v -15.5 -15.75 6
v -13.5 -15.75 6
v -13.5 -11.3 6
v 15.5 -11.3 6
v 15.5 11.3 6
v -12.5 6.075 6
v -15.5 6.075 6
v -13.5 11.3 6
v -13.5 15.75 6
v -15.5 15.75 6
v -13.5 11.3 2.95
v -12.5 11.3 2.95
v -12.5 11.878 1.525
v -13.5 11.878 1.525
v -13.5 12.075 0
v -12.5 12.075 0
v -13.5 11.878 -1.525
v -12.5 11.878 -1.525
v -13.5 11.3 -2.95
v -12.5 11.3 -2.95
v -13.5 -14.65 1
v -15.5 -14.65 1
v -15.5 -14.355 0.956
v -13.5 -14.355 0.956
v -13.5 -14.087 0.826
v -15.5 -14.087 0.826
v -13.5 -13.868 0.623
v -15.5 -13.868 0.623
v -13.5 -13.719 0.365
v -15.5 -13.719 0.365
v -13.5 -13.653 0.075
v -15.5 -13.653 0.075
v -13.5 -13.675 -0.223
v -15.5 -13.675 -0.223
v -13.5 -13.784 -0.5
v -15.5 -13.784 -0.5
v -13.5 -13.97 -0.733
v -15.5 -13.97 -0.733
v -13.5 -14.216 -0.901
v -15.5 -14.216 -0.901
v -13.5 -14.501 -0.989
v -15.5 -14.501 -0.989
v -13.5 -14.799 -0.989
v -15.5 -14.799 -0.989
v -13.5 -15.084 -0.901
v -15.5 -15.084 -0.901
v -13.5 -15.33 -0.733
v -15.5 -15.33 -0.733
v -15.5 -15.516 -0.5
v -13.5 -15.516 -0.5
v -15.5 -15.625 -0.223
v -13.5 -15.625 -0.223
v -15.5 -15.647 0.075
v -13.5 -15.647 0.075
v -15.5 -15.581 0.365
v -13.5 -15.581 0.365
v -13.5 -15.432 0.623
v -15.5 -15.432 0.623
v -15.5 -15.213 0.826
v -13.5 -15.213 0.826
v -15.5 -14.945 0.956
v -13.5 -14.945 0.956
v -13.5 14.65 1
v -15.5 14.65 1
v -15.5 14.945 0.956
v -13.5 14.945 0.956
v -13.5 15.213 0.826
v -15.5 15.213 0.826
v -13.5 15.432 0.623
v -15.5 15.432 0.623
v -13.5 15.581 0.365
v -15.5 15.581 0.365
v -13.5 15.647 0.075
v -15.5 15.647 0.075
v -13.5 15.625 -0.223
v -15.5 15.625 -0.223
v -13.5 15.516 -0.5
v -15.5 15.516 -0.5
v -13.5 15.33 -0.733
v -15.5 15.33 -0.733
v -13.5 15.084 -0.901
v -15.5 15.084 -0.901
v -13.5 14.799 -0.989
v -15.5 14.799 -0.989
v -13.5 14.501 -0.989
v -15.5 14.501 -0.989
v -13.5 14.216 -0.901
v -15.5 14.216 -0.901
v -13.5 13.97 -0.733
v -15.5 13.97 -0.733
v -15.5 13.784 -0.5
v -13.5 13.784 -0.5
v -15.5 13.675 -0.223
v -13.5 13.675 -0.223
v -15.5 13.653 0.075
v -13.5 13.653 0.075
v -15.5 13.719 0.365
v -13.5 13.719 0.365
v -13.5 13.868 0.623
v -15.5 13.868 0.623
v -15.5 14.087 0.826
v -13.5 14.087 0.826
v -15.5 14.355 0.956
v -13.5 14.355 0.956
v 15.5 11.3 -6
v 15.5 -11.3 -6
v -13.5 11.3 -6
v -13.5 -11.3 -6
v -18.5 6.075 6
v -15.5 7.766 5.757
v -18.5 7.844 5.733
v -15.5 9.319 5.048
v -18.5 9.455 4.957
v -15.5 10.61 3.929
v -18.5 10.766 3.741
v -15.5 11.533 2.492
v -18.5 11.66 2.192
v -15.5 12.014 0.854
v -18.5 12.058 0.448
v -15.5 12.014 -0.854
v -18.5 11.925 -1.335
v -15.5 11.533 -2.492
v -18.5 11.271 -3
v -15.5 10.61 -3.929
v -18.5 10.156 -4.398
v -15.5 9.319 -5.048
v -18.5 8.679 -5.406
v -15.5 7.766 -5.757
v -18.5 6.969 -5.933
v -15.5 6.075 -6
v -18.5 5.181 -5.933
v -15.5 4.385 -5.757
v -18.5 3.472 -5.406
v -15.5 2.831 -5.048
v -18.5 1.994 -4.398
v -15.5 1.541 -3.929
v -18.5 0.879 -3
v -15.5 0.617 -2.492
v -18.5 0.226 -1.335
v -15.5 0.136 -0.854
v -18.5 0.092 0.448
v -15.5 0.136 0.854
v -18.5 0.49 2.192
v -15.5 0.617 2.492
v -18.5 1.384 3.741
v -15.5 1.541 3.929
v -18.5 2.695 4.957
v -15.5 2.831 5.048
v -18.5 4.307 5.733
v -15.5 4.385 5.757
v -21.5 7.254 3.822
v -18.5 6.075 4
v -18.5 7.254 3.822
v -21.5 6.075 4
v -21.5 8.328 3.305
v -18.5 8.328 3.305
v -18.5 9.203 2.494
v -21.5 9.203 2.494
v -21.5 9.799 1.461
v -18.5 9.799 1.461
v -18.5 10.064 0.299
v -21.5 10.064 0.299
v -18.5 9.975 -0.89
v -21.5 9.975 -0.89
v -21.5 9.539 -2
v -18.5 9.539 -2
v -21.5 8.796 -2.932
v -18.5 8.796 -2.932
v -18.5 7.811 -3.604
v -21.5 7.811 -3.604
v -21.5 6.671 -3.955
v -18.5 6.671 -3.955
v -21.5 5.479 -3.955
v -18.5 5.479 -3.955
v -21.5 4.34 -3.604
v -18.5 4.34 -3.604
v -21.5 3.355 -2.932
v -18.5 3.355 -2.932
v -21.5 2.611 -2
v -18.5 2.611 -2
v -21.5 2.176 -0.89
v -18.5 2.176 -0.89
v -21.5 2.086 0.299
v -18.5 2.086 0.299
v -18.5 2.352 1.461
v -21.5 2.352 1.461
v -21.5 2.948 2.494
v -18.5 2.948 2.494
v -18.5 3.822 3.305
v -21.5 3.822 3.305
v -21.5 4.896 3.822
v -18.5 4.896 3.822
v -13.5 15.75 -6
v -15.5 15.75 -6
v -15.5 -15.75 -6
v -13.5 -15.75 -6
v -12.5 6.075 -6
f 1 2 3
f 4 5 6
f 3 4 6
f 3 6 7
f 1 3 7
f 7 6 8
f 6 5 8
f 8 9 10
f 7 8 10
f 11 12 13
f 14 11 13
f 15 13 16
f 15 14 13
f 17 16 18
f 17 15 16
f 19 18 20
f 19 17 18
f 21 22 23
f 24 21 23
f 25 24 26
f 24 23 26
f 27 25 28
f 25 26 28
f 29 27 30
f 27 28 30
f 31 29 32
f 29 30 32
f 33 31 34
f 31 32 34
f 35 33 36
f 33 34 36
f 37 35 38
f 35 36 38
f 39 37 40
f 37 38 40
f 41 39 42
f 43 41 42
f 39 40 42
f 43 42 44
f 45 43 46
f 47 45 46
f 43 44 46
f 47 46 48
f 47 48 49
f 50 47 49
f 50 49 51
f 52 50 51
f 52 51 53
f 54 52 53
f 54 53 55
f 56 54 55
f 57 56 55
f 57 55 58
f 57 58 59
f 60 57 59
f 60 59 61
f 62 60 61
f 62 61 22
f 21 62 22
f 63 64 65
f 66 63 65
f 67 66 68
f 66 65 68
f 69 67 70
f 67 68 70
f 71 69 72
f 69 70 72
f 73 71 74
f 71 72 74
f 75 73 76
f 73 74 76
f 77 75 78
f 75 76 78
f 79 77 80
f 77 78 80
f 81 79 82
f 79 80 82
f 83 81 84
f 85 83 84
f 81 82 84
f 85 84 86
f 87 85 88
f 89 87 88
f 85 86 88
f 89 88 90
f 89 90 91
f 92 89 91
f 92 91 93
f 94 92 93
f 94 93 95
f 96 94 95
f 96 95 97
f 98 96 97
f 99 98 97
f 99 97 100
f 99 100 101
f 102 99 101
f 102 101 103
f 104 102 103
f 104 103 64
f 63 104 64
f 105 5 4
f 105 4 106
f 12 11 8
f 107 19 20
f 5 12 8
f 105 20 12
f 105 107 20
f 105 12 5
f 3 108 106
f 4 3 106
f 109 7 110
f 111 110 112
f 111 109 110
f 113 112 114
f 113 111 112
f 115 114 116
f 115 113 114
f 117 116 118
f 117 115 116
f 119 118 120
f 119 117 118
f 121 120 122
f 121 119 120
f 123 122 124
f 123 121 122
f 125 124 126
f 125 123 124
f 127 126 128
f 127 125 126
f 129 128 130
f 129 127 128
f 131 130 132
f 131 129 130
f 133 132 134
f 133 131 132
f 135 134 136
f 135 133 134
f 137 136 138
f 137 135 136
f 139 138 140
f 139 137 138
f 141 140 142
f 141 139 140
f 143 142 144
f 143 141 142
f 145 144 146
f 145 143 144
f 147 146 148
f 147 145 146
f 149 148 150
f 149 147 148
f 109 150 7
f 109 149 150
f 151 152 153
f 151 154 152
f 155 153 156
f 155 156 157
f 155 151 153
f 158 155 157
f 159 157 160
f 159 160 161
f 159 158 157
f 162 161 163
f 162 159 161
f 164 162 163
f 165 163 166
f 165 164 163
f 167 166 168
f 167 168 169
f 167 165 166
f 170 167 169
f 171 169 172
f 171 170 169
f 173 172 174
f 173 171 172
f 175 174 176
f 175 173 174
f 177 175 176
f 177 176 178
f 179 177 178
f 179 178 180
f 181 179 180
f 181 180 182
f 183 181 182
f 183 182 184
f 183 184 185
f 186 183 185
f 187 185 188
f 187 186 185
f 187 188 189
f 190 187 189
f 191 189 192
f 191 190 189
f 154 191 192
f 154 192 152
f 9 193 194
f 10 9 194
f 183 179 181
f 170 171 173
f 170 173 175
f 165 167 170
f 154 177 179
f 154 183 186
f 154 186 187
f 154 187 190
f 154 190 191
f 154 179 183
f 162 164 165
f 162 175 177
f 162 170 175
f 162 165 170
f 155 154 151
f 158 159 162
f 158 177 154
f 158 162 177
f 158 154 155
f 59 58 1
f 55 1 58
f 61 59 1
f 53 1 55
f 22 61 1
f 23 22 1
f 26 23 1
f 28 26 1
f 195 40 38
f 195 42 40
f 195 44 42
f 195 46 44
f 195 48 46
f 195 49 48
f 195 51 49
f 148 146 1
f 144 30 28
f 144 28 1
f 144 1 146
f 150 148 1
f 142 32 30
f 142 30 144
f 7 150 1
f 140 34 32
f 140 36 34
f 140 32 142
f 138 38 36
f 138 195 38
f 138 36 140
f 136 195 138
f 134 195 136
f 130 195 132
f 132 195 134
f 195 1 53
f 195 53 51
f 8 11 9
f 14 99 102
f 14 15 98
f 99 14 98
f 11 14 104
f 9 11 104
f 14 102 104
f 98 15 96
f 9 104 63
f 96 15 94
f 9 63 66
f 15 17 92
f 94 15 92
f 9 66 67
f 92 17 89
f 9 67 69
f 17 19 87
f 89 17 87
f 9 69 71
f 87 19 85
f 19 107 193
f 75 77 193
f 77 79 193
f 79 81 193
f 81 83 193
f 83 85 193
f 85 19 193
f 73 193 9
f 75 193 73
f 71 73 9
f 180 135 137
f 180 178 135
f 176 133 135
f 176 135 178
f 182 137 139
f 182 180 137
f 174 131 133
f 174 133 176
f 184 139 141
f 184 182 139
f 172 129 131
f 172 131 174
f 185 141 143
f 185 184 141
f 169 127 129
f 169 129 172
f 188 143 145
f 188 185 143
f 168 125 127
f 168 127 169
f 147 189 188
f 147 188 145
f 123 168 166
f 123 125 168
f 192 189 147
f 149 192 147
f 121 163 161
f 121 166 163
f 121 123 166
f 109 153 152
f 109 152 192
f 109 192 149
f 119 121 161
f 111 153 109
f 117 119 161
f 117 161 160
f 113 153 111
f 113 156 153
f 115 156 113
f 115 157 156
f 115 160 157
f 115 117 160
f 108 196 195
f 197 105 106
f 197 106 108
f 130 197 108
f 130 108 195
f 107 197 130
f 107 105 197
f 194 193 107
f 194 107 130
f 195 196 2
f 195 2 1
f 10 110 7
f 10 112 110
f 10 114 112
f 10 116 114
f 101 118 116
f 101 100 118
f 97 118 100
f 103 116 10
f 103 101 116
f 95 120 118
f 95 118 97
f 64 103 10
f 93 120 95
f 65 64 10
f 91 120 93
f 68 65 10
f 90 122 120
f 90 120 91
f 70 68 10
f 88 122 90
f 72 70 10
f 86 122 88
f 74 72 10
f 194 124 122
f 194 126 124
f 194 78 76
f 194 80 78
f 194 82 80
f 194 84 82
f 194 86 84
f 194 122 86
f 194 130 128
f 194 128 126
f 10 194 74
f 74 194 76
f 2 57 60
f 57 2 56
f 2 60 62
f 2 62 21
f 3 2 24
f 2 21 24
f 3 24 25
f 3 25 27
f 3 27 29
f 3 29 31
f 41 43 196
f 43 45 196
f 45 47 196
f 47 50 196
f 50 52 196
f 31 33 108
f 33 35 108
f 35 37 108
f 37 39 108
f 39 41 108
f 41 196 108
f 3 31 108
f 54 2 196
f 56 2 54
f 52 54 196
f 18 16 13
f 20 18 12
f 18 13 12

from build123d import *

# Parameters (mm, degrees)
SKETCH1_W           = 31
SKETCH1_H           = 12
BOSS_EXTRUDE1_DEPTH = 11.3
SKETCH3_W           = 2
SKETCH3_H           = 4.45
BOSS_EXTRUDE2_DEPTH = 12
SKETCH4_W           = 2
SKETCH4_H           = 4.45
BOSS_EXTRUDE3_DEPTH = 12
SKETCH5_R           = 1
CUT_EXTRUDE1_DEPTH  = 36.285443174
SKETCH6_R           = 6
BOSS_EXTRUDE4_DEPTH = 3
SKETCH8_R           = 4
BOSS_EXTRUDE5_DEPTH = 3


with BuildPart() as part:
    # Sketch1 → Boss-Extrude1 (new, symmetric)
    with BuildSketch(Plane(origin=(0, 0, 0), x_dir=(1, 0, 0), z_dir=(0, 1, 0))):
        Rectangle(SKETCH1_W, SKETCH1_H)
    extrude(amount=BOSS_EXTRUDE1_DEPTH, both=True)

    # Sketch3 → Boss-Extrude2 (add)
    with BuildSketch(Plane(origin=(0, 0, -6), x_dir=(-1, 0, 0), z_dir=(0, 0, -1))):
        with Locations((14.5, 13.525)):
            Rectangle(SKETCH3_W, SKETCH3_H)
    extrude(amount=-BOSS_EXTRUDE2_DEPTH)

    # Sketch4 → Boss-Extrude3 (add)
    with BuildSketch(Plane(origin=(0, 0, -6), x_dir=(-1, 0, 0), z_dir=(0, 0, -1))):
        with Locations((14.5, -13.525)):
            Rectangle(SKETCH4_W, SKETCH4_H)
    extrude(amount=-BOSS_EXTRUDE3_DEPTH)

    # Sketch5 → Cut-Extrude1 (cut, through all)
    with BuildSketch(Plane.ZY.offset(15.5)):
        with Locations((0, 14.65)):
            Circle(SKETCH5_R)
        with Locations((0, -14.65)):
            Circle(SKETCH5_R)
    extrude(amount=-CUT_EXTRUDE1_DEPTH, mode=Mode.SUBTRACT)

    # Sketch6 → Boss-Extrude4 (add, symmetric)
    with BuildSketch(Plane.ZY.offset(15.5)):
        with Locations((0, 6.07521459)):
            Circle(SKETCH6_R)
    extrude(amount=BOSS_EXTRUDE4_DEPTH, both=True)

    # Sketch8 → Boss-Extrude5 (add, symmetric)
    with BuildSketch(Plane.ZY.offset(18.5)):
        with Locations((0, 6.07521459)):
            Circle(SKETCH8_R)
    extrude(amount=BOSS_EXTRUDE5_DEPTH, both=True)


solid = part.part
